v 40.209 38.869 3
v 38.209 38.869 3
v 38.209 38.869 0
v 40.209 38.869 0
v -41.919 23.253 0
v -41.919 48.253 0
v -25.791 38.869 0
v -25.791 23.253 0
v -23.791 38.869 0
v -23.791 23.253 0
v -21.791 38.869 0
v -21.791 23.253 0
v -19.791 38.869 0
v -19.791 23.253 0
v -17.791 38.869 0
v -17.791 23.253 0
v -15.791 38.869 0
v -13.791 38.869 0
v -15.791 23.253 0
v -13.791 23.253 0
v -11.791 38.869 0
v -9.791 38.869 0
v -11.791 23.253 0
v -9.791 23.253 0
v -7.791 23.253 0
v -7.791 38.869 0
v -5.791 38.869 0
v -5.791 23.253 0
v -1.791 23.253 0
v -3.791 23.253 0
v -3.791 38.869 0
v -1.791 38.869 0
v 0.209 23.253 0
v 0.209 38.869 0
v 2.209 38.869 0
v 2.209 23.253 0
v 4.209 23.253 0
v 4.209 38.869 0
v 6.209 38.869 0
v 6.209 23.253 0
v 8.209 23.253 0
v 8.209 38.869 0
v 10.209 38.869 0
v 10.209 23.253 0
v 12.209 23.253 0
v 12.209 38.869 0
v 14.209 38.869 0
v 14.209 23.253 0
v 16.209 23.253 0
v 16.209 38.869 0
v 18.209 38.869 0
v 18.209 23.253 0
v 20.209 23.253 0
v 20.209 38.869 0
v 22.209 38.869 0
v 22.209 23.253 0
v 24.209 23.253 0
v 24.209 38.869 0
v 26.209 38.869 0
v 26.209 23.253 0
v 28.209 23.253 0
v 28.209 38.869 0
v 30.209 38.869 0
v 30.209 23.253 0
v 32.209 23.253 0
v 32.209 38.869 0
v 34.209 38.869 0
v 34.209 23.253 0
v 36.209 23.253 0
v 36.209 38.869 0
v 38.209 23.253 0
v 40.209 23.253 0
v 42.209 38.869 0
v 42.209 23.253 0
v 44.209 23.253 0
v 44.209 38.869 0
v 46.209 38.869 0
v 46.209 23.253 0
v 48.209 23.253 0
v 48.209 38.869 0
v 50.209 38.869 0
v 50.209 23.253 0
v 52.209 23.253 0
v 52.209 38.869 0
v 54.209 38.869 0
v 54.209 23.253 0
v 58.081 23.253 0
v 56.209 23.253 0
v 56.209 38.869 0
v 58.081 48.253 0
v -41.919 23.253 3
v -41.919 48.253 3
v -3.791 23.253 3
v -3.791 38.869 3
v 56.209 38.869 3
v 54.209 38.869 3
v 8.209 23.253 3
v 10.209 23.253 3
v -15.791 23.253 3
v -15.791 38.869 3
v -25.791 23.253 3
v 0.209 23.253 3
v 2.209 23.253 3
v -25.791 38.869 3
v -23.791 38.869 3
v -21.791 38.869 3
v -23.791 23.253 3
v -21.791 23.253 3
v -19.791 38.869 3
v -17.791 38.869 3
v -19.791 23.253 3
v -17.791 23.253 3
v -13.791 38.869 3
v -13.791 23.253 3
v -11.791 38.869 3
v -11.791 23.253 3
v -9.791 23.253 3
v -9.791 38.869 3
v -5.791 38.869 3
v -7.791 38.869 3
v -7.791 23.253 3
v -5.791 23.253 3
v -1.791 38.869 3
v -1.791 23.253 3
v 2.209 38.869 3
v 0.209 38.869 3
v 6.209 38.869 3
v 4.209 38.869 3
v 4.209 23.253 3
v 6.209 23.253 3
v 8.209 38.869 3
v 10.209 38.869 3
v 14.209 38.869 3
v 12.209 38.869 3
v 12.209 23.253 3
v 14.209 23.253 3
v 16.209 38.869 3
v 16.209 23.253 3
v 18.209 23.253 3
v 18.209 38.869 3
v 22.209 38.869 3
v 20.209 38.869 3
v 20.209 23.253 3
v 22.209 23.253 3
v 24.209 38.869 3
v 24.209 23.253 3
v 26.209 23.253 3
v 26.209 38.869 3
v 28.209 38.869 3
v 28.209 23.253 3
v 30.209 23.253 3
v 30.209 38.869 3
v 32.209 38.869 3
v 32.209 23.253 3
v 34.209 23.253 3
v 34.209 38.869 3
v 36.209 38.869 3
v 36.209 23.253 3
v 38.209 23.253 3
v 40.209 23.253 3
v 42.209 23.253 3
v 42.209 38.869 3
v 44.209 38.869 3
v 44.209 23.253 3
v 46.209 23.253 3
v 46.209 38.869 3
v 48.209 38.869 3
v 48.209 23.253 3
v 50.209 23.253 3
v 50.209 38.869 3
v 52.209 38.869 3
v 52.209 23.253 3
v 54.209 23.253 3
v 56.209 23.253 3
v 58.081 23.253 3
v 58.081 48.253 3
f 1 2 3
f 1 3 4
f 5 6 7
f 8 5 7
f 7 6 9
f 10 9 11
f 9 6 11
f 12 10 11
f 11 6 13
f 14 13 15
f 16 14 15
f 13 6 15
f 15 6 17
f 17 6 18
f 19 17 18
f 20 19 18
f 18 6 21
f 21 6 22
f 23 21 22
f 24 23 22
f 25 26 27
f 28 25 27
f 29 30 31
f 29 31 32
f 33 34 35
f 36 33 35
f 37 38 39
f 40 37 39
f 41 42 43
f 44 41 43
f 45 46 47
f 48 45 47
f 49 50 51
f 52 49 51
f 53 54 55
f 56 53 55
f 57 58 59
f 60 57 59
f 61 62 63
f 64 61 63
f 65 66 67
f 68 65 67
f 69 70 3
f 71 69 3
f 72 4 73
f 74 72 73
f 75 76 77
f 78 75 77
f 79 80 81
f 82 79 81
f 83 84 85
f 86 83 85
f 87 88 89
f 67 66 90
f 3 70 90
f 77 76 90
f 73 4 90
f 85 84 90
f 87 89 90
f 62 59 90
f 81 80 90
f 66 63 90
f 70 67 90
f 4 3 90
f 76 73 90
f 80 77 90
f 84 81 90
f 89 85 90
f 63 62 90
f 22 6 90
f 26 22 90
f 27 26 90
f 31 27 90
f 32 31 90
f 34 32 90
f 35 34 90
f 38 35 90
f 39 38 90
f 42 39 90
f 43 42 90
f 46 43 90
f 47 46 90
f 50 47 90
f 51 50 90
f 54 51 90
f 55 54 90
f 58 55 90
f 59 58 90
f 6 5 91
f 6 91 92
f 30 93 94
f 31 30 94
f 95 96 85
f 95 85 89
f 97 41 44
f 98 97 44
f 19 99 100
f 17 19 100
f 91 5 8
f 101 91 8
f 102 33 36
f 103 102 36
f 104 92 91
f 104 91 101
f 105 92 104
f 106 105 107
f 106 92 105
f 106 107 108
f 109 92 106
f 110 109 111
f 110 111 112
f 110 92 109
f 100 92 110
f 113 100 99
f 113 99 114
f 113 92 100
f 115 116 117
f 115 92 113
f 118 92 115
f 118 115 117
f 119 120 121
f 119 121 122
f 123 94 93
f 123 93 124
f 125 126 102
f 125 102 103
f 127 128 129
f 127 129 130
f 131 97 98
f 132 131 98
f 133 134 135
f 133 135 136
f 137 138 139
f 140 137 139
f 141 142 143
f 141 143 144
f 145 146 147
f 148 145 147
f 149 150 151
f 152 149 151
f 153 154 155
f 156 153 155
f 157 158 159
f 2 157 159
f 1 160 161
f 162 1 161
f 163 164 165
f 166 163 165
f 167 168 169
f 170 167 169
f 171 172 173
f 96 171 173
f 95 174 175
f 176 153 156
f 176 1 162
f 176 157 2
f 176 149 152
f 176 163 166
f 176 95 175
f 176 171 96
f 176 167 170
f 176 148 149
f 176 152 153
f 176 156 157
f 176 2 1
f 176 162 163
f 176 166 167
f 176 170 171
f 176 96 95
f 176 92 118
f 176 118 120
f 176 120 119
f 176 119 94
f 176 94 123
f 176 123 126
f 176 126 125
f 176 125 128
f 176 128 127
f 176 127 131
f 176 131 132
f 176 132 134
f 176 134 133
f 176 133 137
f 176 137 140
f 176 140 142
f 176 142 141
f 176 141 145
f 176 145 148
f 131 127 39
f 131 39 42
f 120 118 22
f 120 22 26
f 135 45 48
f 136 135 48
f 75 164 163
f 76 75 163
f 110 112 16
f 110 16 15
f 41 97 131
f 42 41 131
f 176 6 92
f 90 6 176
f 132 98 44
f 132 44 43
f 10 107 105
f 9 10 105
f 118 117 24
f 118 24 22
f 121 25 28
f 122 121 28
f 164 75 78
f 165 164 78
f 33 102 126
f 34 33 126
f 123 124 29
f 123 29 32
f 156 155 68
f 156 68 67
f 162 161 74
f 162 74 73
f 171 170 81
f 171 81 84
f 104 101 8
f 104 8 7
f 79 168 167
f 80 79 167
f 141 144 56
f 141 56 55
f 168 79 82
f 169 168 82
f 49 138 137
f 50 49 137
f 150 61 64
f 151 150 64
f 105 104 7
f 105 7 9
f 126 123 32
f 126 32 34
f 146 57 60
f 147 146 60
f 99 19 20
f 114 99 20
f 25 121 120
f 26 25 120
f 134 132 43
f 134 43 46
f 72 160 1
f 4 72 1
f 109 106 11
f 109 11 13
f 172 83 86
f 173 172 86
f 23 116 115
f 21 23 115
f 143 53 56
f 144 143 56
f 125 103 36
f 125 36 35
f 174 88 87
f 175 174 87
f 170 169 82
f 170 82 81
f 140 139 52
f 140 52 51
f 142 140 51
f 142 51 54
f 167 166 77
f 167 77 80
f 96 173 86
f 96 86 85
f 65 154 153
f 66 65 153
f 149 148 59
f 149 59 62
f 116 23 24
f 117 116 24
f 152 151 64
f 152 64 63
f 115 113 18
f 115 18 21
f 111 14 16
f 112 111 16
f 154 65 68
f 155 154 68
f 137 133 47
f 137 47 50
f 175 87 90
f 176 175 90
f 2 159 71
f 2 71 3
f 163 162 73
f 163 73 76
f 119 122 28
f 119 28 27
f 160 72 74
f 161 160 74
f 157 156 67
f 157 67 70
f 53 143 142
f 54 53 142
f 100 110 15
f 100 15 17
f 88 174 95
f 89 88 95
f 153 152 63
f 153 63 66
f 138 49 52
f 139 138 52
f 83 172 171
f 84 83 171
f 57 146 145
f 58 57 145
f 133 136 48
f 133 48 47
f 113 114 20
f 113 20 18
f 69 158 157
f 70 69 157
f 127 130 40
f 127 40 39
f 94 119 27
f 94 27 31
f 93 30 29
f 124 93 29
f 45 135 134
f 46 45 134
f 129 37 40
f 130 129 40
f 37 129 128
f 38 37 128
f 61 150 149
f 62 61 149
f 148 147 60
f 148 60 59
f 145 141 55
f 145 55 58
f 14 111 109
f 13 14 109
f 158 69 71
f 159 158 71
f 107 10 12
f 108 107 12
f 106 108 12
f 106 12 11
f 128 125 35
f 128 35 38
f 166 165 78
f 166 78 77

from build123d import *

# Parameters (mm, degrees)
F0_W     = 100
F0_H     = 25
F1_DEPTH = 3
F2_W     = 2
F2_H     = 21.208797
F3_DEPTH = 25


with BuildPart() as f1:
    # F0 (on Top) → F1 (new body)
    with BuildSketch(Plane.XY):
        with Locations((8.08065, 35.752659)):
            Rectangle(F0_W, F0_H)
    extrude(amount=F1_DEPTH)

    # F2 (on face) → F3 (cut)
    with BuildSketch(Plane.XY.offset(3)):
        with Locations((-24.790619, 28.26475)):
            Rectangle(F2_W, F2_H)
        with Locations((-20.790619, 28.26475)):
            Rectangle(F2_W, F2_H)
        with Locations((-16.790619, 28.26475)):
            Rectangle(F2_W, F2_H)
        with Locations((-12.790619, 28.26475)):
            Rectangle(F2_W, F2_H)
        with Locations((-8.790619, 28.26475)):
            Rectangle(F2_W, F2_H)
        with Locations((-4.790619, 28.26475)):
            Rectangle(F2_W, F2_H)
        with Locations((-0.790619, 28.26475)):
            Rectangle(F2_W, F2_H)
        with Locations((3.209381, 28.26475)):
            Rectangle(F2_W, F2_H)
        with Locations((7.209381, 28.26475)):
            Rectangle(F2_W, F2_H)
        with Locations((11.209381, 28.26475)):
            Rectangle(F2_W, F2_H)
        with Locations((15.209381, 28.26475)):
            Rectangle(F2_W, F2_H)
        with Locations((19.209381, 28.26475)):
            Rectangle(F2_W, F2_H)
        with Locations((23.209381, 28.26475)):
            Rectangle(F2_W, F2_H)
        with Locations((27.209381, 28.26475)):
            Rectangle(F2_W, F2_H)
        with Locations((31.209381, 28.26475)):
            Rectangle(F2_W, F2_H)
        with Locations((35.209381, 28.26475)):
            Rectangle(F2_W, F2_H)
        with Locations((39.209381, 28.26475)):
            Rectangle(F2_W, F2_H)
        with Locations((43.209381, 28.26475)):
            Rectangle(F2_W, F2_H)
        with Locations((47.209381, 28.26475)):
            Rectangle(F2_W, F2_H)
        with Locations((51.209381, 28.26475)):
            Rectangle(F2_W, F2_H)
        with Locations((55.209381, 28.26475)):
            Rectangle(F2_W, F2_H)
    extrude(amount=-F3_DEPTH, mode=Mode.SUBTRACT)


solid = f1.part
